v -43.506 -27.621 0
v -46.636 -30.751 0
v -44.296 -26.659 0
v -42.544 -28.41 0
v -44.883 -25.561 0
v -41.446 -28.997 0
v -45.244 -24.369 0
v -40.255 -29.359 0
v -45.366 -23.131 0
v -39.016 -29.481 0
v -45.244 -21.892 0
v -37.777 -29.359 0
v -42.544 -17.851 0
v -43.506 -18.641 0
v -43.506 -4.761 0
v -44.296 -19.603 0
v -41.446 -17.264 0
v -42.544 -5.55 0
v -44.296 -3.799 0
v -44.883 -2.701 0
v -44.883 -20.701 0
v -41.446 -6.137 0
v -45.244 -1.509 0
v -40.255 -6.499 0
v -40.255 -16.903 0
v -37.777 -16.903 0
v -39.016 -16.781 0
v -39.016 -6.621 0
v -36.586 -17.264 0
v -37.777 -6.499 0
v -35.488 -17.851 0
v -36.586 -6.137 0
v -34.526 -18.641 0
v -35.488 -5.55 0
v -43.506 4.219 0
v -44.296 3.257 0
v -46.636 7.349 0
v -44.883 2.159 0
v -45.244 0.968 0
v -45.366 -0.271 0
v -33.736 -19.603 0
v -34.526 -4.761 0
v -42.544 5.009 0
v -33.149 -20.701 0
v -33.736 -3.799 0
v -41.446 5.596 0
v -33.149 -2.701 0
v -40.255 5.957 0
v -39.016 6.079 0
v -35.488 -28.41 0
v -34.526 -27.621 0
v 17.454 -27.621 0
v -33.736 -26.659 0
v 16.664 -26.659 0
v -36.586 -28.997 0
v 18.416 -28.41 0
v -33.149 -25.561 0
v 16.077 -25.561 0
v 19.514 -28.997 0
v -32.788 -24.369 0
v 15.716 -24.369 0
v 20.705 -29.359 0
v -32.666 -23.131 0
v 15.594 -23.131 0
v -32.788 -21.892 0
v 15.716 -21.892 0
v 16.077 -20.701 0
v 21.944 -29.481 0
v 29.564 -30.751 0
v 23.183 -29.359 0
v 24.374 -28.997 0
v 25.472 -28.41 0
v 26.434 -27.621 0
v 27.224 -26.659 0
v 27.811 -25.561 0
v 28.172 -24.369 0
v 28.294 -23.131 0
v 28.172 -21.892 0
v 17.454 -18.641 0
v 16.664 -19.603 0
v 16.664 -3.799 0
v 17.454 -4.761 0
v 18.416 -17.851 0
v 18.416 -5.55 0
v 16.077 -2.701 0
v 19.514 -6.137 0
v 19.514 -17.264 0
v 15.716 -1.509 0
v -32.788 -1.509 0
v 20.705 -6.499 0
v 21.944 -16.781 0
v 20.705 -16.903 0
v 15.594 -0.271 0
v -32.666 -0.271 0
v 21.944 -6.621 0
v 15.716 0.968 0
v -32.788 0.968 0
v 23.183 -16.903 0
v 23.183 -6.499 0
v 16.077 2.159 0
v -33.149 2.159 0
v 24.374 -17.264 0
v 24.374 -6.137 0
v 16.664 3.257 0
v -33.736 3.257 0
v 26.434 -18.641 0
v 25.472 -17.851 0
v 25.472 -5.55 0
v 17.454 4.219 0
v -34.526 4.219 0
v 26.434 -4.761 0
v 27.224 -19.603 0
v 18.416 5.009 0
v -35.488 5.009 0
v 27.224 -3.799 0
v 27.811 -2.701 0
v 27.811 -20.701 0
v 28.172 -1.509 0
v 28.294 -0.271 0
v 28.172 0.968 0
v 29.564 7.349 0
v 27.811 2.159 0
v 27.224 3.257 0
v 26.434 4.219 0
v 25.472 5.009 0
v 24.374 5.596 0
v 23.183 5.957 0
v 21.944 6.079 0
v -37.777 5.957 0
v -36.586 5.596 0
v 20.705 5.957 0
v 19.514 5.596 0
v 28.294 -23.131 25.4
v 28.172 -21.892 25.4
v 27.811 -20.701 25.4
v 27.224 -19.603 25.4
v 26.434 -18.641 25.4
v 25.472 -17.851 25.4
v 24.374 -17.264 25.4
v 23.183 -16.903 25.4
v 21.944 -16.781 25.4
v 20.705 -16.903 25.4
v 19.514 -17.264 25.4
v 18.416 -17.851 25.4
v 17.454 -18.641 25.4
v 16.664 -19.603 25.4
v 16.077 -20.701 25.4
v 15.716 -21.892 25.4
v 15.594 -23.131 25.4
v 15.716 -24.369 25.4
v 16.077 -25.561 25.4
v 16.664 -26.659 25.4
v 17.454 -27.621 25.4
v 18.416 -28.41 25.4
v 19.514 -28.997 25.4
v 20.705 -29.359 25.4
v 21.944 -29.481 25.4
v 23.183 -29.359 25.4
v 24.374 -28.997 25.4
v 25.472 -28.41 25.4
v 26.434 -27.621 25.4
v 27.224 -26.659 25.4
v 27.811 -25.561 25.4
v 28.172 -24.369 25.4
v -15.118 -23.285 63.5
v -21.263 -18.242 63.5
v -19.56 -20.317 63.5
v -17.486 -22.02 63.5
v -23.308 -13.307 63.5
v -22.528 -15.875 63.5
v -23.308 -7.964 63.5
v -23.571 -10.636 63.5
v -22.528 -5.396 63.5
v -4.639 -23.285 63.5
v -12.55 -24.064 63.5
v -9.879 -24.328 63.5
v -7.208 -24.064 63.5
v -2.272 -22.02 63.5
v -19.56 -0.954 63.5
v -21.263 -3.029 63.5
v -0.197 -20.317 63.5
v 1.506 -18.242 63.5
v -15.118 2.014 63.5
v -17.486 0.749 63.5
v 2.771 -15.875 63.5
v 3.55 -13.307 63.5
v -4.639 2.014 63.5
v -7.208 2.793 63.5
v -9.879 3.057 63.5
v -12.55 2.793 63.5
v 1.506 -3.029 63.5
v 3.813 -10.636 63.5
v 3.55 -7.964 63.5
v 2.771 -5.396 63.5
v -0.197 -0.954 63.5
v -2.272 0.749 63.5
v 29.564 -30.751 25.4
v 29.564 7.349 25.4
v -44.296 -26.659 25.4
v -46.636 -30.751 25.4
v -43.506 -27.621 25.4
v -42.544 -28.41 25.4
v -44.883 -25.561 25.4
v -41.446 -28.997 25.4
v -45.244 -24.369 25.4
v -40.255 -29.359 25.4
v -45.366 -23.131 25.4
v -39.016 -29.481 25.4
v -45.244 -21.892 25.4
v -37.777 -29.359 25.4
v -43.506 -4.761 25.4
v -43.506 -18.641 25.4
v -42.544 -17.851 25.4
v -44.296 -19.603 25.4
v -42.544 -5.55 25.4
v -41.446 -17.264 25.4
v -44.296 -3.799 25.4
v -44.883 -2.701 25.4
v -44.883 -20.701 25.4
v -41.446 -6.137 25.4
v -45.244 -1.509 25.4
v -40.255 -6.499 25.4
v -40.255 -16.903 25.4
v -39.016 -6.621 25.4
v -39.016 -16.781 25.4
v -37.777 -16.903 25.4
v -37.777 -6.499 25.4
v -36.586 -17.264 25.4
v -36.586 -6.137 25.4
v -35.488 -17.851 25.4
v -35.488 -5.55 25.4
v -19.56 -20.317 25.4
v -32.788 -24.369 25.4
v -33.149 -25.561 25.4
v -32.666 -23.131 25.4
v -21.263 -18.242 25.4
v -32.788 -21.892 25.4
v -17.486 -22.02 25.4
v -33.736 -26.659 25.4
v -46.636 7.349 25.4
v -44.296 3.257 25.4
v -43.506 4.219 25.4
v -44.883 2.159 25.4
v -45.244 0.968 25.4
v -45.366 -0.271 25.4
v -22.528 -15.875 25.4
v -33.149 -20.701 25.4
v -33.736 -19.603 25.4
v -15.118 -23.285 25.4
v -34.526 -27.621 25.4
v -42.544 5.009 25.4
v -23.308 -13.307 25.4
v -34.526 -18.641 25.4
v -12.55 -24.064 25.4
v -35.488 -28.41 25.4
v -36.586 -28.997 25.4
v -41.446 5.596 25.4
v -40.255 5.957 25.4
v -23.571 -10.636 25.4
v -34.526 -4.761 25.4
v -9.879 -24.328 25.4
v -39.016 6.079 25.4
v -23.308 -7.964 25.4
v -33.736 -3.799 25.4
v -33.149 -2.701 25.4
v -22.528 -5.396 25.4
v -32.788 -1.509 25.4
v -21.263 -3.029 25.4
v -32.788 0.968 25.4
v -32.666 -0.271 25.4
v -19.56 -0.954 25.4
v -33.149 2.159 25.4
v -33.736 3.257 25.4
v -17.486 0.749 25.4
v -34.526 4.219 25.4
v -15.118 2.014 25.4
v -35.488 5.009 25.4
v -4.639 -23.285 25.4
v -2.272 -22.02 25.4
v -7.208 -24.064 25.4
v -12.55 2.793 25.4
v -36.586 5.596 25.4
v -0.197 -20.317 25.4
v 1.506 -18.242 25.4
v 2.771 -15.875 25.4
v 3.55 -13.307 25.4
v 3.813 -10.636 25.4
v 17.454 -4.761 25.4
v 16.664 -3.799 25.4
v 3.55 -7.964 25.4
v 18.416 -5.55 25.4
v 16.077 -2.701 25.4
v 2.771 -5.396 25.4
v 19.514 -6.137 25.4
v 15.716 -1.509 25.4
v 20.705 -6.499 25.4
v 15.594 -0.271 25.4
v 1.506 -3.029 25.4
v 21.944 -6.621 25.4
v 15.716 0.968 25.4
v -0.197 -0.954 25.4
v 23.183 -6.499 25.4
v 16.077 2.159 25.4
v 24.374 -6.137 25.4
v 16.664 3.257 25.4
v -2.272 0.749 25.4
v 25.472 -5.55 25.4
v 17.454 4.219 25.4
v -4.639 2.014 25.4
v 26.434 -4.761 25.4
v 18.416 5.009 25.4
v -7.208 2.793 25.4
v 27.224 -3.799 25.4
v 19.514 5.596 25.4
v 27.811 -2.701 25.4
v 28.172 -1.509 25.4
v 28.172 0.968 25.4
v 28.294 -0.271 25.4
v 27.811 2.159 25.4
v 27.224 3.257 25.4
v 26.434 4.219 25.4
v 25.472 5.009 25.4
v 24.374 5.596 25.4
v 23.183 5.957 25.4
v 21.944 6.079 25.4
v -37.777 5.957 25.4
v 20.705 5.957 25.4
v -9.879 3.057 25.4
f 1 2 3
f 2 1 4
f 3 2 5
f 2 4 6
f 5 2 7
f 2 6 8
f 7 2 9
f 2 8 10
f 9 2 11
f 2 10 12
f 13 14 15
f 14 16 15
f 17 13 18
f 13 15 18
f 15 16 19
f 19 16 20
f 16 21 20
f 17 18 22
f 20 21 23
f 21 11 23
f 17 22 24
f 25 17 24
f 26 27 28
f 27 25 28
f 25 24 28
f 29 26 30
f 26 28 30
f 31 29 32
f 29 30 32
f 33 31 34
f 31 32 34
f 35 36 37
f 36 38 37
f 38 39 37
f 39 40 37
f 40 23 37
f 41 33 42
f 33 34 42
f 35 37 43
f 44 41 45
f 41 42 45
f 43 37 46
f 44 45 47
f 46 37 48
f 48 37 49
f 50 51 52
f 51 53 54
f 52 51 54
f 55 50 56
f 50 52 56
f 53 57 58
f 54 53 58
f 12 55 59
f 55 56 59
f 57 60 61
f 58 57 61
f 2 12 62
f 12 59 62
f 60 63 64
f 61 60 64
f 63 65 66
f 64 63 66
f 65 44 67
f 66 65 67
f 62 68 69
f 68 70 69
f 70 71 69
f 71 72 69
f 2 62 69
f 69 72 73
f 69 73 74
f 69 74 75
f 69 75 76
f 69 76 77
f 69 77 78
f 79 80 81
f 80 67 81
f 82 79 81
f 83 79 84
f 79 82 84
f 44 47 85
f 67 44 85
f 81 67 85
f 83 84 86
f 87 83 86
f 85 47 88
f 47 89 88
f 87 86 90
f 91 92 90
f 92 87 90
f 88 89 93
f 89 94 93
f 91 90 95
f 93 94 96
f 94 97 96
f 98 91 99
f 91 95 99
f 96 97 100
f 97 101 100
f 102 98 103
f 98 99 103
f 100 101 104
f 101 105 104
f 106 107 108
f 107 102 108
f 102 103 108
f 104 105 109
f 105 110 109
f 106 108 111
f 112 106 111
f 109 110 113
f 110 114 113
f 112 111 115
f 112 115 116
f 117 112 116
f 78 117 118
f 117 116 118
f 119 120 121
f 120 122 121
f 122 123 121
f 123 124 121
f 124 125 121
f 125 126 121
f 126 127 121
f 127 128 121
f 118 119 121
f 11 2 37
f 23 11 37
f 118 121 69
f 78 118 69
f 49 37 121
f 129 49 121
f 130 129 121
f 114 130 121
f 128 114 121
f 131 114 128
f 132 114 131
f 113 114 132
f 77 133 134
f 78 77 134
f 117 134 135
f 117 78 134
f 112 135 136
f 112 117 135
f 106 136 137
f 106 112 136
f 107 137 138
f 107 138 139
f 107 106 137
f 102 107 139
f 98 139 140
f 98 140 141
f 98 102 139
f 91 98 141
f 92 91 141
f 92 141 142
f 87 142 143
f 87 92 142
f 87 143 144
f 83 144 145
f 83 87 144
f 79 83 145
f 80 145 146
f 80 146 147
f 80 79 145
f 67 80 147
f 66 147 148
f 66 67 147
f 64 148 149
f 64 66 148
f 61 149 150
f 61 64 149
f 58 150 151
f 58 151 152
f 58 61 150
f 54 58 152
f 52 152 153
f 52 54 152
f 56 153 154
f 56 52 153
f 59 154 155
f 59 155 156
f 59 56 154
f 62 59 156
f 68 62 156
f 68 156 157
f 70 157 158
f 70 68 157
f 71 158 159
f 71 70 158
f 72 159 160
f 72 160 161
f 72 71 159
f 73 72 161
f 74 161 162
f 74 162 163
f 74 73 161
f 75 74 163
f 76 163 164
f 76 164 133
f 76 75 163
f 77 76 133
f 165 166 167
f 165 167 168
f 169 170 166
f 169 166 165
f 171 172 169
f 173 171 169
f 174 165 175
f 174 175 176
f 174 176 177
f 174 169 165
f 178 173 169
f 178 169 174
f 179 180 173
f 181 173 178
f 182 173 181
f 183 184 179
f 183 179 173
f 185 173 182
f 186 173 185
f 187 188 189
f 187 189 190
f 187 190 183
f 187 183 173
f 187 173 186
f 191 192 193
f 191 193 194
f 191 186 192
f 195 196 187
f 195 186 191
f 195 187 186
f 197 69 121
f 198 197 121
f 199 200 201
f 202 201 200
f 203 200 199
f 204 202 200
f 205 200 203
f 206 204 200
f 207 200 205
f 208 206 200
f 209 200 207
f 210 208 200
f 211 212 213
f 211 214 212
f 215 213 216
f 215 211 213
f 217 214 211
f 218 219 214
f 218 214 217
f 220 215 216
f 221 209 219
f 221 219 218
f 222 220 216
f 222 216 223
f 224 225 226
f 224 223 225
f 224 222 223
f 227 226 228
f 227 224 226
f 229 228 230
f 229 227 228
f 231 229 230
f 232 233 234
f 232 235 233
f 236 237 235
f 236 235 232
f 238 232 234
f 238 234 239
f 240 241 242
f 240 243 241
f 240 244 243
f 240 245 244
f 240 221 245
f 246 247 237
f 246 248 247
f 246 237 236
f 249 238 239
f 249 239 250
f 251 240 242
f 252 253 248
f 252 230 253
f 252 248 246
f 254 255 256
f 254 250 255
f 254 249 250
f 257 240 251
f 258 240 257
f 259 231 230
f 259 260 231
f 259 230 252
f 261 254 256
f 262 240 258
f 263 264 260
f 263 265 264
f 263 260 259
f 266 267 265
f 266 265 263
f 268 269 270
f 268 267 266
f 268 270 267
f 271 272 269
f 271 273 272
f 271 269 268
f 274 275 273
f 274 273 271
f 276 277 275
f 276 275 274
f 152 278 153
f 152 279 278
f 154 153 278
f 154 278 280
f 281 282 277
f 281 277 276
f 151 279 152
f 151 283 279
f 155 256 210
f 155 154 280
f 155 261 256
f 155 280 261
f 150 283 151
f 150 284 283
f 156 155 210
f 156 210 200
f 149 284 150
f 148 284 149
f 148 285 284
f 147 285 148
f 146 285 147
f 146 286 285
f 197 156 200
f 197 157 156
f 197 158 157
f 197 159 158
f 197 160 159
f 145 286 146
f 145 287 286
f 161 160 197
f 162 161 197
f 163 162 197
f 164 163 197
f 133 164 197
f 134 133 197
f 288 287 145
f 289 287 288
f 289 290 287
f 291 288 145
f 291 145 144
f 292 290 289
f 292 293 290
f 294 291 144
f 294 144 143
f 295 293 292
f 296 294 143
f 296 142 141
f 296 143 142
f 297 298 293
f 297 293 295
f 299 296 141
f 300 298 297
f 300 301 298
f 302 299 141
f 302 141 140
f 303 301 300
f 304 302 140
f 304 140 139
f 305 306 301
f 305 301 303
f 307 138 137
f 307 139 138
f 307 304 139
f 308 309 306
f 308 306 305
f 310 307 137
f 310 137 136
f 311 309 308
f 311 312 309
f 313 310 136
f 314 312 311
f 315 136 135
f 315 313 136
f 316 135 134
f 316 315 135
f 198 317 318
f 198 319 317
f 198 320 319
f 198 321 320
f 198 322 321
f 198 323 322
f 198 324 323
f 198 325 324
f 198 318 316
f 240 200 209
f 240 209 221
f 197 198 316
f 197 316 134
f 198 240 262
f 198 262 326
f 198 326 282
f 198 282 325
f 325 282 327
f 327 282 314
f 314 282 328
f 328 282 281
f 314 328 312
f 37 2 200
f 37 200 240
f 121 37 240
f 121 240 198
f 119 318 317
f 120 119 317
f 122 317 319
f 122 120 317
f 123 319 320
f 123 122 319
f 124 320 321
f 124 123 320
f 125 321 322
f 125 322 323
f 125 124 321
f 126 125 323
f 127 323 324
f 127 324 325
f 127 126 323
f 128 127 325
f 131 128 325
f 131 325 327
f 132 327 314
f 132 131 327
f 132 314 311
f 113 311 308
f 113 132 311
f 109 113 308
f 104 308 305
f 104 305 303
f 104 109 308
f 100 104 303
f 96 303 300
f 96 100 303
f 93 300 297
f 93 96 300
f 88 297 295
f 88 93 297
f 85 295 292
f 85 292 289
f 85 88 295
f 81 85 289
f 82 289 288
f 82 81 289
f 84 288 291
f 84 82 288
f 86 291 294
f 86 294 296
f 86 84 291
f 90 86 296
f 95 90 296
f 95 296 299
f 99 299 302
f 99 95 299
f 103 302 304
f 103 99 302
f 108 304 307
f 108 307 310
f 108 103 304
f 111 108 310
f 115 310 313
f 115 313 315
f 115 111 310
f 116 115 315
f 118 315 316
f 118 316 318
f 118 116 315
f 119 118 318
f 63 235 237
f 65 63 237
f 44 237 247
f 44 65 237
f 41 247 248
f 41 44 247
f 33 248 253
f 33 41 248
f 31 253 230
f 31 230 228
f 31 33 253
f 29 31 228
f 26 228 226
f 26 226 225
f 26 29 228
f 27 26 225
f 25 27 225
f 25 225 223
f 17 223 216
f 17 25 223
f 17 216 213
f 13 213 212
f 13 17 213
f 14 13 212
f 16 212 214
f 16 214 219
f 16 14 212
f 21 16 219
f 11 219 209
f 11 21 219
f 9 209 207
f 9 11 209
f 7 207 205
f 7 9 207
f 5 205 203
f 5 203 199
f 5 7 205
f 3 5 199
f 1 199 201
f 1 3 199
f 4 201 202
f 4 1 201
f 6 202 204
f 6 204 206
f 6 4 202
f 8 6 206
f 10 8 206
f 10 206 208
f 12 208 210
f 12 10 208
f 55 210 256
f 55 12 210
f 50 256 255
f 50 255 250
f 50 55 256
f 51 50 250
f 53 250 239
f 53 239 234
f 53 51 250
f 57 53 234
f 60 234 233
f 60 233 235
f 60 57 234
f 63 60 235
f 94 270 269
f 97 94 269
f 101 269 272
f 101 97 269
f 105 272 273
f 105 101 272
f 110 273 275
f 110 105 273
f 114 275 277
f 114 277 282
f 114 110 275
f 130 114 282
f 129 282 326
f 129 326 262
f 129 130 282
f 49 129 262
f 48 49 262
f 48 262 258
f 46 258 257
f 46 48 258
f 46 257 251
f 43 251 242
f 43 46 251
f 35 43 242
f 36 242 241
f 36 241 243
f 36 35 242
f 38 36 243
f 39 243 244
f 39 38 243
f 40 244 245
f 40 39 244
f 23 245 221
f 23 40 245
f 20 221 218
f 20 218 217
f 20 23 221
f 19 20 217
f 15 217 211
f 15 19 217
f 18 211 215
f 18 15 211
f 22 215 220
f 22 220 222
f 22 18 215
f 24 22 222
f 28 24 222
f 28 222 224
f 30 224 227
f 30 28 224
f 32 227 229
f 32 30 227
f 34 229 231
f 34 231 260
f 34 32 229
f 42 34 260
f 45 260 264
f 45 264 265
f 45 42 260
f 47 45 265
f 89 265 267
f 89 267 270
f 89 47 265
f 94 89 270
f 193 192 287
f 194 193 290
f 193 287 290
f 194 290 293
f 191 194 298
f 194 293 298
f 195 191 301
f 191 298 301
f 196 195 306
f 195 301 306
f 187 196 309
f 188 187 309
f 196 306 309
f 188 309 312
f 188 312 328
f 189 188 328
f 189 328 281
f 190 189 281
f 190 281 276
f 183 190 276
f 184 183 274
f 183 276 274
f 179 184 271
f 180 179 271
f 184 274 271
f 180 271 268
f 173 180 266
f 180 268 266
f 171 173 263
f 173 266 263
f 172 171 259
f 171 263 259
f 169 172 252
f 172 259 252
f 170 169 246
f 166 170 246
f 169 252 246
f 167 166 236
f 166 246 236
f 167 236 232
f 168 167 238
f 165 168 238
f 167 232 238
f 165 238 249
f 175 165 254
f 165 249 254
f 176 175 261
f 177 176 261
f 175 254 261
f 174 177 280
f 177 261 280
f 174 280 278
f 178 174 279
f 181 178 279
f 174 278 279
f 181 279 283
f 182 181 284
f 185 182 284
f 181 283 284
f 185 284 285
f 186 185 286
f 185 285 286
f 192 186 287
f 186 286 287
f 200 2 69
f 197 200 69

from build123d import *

# Parameters (mm, degrees)
F0_W      = 76.2
F0_H      = 38.1
F1_DEPTH  = 25.4
F2_R      = 6.35
F3_DEPTH  = 25.4
F4_R      = 6.35
F5_DEPTH  = 25.4
F6_R      = 6.35
F7_DEPTH  = 25.4
F8_R      = 6.35
F9_DEPTH  = 25.4
F10_R     = 13.692048
F11_DEPTH = 38.1
F12_W     = 12.7
F12_H     = 12.7


with BuildPart() as f1:
    # F0 (on Top) → F1 (new body)
    with BuildSketch(Plane.XY):
        with Locations((-8.536067, -11.700657)):
            Rectangle(F0_W, F0_H)
    extrude(amount=F1_DEPTH)

    # F2 (on Top) → F3 (cut)
    with BuildSketch(Plane.XY):
        with Locations((-39.016067, -0.270657)):
            Circle(F2_R)
    extrude(amount=F3_DEPTH, mode=Mode.SUBTRACT)

    # F4 (on Top) → F5 (cut)
    with BuildSketch(Plane.XY):
        with Locations((21.943933, -0.270657)):
            Circle(F4_R)
    extrude(amount=F5_DEPTH, mode=Mode.SUBTRACT)

    # F6 (on Top) → F7 (cut)
    with BuildSketch(Plane.XY):
        with Locations((-39.016067, -23.130657)):
            Circle(F6_R)
    extrude(amount=F7_DEPTH, mode=Mode.SUBTRACT)

    # F8 (on Top) → F9 (cut)
    with BuildSketch(Plane.XY):
        with Locations((21.943933, -23.130657)):
            Circle(F8_R)
    extrude(amount=F9_DEPTH, mode=Mode.SUBTRACT)

    # F10 (on face) → F11 (join)
    with BuildSketch(Plane.XY.offset(25.4)):
        with Locations((-9.878693, -10.635504)):
            Circle(F10_R)
    extrude(amount=F11_DEPTH)

    # F12 (on Front) → F13 (revolve, cut)
    with BuildSketch(Plane.XZ):
        with Locations((-25.066885, 39.424001)):
            Rectangle(F12_W, F12_H)
    revolve(axis=Axis((-9.878693, -10.635504, 63.5), (0, 0, 1)), mode=Mode.SUBTRACT)


solid = f1.part
